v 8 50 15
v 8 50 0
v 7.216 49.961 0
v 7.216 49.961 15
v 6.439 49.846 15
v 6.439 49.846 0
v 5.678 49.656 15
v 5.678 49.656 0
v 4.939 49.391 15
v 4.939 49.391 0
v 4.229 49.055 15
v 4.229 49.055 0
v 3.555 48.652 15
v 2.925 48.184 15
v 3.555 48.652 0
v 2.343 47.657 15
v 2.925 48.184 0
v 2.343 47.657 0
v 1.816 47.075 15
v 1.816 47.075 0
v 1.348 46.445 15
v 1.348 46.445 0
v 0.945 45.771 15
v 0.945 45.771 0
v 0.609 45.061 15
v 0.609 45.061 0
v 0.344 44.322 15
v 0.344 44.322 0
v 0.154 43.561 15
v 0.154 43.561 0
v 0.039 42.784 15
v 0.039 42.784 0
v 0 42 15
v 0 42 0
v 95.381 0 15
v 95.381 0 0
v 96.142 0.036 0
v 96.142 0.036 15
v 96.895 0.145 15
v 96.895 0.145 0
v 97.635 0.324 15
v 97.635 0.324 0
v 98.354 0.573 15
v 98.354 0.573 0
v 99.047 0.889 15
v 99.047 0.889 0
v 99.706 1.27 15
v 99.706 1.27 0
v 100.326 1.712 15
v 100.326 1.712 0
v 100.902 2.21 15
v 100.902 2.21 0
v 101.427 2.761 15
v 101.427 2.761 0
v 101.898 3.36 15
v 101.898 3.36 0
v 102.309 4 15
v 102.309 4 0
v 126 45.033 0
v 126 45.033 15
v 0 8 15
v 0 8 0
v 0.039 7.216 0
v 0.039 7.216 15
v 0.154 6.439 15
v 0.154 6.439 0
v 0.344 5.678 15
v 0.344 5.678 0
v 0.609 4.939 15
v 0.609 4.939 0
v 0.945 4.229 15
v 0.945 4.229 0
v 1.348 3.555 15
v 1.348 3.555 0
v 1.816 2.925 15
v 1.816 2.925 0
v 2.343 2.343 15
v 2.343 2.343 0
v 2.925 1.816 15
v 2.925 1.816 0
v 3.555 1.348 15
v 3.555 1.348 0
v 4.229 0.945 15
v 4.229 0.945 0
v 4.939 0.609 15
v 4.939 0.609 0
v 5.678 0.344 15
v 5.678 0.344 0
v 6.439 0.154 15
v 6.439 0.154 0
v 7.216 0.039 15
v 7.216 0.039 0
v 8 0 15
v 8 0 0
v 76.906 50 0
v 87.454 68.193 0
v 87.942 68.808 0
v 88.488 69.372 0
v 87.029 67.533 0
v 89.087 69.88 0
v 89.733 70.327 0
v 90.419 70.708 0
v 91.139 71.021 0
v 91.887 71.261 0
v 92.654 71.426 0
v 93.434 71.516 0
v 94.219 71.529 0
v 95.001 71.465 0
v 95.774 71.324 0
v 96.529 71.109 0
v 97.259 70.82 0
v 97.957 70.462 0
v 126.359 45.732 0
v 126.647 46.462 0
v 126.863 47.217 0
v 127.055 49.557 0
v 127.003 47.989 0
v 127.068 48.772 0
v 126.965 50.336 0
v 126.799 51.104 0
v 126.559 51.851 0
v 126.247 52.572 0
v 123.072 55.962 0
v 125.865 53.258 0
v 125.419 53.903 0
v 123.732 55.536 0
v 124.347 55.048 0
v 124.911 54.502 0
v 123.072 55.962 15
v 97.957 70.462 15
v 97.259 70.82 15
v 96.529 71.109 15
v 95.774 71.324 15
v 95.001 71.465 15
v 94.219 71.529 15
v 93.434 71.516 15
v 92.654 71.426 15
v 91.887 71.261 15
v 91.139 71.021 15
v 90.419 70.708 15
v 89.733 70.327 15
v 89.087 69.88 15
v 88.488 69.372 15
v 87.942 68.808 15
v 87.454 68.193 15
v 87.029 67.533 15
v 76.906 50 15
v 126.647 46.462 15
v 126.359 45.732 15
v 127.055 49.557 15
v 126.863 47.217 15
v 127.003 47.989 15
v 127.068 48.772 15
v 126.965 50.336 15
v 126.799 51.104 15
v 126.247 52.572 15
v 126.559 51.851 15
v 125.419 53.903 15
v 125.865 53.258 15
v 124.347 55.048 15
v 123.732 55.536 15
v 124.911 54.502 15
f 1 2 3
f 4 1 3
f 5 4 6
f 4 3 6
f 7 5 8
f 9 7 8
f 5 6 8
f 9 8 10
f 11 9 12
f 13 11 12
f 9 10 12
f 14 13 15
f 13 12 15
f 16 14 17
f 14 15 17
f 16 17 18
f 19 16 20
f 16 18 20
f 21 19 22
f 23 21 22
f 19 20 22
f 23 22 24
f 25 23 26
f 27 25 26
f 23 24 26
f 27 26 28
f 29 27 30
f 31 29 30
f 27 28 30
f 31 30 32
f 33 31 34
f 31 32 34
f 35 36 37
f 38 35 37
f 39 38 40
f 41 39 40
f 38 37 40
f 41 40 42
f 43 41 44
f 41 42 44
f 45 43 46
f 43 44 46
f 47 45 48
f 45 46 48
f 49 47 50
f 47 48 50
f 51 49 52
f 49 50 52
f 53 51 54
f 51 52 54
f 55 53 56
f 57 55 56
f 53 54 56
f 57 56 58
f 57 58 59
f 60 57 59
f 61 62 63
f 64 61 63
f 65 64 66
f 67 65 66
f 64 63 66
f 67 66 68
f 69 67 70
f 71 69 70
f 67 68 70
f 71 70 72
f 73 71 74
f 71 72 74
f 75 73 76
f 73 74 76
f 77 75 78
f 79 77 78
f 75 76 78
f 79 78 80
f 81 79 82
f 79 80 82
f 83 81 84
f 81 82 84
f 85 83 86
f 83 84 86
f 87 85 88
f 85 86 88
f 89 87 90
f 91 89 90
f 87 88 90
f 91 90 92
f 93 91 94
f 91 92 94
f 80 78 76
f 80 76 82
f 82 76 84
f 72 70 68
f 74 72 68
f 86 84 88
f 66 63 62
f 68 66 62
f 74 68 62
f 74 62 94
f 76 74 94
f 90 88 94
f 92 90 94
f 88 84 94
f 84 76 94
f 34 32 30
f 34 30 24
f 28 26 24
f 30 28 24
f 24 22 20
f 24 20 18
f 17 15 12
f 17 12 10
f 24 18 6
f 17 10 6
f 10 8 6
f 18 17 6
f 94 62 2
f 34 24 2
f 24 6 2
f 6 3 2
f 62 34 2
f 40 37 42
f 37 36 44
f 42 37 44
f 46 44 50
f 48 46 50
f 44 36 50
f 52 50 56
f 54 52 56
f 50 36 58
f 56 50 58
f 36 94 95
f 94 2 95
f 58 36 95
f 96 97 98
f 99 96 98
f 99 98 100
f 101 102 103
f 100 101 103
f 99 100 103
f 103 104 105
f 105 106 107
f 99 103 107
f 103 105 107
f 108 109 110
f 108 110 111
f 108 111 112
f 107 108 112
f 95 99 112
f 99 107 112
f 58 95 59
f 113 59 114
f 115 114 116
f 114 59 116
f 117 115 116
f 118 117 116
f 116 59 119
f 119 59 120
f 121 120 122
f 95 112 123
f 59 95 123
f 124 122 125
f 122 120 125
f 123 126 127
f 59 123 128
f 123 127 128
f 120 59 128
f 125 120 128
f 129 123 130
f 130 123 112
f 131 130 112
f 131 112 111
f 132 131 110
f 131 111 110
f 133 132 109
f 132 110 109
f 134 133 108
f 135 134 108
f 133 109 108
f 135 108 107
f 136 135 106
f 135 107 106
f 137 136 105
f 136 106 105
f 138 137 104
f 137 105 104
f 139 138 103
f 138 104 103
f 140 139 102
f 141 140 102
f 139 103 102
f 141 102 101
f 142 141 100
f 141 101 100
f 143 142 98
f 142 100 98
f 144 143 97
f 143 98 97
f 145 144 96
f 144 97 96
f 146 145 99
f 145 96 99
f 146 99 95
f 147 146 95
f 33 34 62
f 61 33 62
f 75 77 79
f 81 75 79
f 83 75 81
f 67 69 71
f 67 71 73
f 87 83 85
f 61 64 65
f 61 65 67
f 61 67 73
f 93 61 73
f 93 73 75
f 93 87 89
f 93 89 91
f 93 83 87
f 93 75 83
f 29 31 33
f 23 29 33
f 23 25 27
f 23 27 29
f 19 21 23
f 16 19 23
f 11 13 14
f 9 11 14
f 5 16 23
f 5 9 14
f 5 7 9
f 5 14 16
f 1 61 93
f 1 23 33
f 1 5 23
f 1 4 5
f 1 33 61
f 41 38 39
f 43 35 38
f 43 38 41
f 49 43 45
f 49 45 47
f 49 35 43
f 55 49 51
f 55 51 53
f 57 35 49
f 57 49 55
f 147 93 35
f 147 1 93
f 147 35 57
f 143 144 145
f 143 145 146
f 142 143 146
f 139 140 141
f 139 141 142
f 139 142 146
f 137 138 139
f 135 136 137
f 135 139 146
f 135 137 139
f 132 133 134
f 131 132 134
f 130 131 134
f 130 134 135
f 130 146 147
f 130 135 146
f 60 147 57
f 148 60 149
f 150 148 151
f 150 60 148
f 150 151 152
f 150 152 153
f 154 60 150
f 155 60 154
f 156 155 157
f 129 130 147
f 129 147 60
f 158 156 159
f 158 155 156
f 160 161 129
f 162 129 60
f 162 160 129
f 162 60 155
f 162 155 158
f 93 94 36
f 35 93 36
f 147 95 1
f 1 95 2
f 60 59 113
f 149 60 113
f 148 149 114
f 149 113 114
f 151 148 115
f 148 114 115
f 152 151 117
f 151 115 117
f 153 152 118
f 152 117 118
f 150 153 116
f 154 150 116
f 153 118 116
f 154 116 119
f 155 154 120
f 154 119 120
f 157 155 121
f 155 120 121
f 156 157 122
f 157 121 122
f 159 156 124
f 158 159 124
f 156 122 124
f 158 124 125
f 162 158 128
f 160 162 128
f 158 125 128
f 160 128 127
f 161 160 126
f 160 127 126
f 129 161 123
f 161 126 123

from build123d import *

# Parameters (mm, degrees)
BOSS_EXTRUDE1_DEPTH = 15


with BuildPart() as part:
    # Sketch1 → Boss-Extrude1 (new body)
    with BuildSketch(Plane.XY):
        with BuildLine():
            Line((8, 0), (95.381197846, 0))
            ThreePointArc((95.381197846, 0), (99.381197846, 1.07179677), (102.309401077, 4))
            Line((102.309401077, 4), (126, 45.033320997))
            ThreePointArc((126, 45.033320997), (126.79920338, 51.103873358), (123.07179677, 55.961524227))
            Line((123.07179677, 55.961524227), (97.95706006, 70.461524227))
            ThreePointArc((97.95706006, 70.461524227), (91.886507699, 71.260727607), (87.02885683, 67.533320997))
            Line((87.02885683, 67.533320997), (76.905989232, 50))
            Line((76.905989232, 50), (8, 50))
            ThreePointArc((8, 50), (2.343145751, 47.656854249), (0, 42))
            Line((0, 42), (0, 8))
            ThreePointArc((0, 8), (2.343145751, 2.343145751), (8, 0))
        make_face()
    extrude(amount=BOSS_EXTRUDE1_DEPTH)


solid = part.part
